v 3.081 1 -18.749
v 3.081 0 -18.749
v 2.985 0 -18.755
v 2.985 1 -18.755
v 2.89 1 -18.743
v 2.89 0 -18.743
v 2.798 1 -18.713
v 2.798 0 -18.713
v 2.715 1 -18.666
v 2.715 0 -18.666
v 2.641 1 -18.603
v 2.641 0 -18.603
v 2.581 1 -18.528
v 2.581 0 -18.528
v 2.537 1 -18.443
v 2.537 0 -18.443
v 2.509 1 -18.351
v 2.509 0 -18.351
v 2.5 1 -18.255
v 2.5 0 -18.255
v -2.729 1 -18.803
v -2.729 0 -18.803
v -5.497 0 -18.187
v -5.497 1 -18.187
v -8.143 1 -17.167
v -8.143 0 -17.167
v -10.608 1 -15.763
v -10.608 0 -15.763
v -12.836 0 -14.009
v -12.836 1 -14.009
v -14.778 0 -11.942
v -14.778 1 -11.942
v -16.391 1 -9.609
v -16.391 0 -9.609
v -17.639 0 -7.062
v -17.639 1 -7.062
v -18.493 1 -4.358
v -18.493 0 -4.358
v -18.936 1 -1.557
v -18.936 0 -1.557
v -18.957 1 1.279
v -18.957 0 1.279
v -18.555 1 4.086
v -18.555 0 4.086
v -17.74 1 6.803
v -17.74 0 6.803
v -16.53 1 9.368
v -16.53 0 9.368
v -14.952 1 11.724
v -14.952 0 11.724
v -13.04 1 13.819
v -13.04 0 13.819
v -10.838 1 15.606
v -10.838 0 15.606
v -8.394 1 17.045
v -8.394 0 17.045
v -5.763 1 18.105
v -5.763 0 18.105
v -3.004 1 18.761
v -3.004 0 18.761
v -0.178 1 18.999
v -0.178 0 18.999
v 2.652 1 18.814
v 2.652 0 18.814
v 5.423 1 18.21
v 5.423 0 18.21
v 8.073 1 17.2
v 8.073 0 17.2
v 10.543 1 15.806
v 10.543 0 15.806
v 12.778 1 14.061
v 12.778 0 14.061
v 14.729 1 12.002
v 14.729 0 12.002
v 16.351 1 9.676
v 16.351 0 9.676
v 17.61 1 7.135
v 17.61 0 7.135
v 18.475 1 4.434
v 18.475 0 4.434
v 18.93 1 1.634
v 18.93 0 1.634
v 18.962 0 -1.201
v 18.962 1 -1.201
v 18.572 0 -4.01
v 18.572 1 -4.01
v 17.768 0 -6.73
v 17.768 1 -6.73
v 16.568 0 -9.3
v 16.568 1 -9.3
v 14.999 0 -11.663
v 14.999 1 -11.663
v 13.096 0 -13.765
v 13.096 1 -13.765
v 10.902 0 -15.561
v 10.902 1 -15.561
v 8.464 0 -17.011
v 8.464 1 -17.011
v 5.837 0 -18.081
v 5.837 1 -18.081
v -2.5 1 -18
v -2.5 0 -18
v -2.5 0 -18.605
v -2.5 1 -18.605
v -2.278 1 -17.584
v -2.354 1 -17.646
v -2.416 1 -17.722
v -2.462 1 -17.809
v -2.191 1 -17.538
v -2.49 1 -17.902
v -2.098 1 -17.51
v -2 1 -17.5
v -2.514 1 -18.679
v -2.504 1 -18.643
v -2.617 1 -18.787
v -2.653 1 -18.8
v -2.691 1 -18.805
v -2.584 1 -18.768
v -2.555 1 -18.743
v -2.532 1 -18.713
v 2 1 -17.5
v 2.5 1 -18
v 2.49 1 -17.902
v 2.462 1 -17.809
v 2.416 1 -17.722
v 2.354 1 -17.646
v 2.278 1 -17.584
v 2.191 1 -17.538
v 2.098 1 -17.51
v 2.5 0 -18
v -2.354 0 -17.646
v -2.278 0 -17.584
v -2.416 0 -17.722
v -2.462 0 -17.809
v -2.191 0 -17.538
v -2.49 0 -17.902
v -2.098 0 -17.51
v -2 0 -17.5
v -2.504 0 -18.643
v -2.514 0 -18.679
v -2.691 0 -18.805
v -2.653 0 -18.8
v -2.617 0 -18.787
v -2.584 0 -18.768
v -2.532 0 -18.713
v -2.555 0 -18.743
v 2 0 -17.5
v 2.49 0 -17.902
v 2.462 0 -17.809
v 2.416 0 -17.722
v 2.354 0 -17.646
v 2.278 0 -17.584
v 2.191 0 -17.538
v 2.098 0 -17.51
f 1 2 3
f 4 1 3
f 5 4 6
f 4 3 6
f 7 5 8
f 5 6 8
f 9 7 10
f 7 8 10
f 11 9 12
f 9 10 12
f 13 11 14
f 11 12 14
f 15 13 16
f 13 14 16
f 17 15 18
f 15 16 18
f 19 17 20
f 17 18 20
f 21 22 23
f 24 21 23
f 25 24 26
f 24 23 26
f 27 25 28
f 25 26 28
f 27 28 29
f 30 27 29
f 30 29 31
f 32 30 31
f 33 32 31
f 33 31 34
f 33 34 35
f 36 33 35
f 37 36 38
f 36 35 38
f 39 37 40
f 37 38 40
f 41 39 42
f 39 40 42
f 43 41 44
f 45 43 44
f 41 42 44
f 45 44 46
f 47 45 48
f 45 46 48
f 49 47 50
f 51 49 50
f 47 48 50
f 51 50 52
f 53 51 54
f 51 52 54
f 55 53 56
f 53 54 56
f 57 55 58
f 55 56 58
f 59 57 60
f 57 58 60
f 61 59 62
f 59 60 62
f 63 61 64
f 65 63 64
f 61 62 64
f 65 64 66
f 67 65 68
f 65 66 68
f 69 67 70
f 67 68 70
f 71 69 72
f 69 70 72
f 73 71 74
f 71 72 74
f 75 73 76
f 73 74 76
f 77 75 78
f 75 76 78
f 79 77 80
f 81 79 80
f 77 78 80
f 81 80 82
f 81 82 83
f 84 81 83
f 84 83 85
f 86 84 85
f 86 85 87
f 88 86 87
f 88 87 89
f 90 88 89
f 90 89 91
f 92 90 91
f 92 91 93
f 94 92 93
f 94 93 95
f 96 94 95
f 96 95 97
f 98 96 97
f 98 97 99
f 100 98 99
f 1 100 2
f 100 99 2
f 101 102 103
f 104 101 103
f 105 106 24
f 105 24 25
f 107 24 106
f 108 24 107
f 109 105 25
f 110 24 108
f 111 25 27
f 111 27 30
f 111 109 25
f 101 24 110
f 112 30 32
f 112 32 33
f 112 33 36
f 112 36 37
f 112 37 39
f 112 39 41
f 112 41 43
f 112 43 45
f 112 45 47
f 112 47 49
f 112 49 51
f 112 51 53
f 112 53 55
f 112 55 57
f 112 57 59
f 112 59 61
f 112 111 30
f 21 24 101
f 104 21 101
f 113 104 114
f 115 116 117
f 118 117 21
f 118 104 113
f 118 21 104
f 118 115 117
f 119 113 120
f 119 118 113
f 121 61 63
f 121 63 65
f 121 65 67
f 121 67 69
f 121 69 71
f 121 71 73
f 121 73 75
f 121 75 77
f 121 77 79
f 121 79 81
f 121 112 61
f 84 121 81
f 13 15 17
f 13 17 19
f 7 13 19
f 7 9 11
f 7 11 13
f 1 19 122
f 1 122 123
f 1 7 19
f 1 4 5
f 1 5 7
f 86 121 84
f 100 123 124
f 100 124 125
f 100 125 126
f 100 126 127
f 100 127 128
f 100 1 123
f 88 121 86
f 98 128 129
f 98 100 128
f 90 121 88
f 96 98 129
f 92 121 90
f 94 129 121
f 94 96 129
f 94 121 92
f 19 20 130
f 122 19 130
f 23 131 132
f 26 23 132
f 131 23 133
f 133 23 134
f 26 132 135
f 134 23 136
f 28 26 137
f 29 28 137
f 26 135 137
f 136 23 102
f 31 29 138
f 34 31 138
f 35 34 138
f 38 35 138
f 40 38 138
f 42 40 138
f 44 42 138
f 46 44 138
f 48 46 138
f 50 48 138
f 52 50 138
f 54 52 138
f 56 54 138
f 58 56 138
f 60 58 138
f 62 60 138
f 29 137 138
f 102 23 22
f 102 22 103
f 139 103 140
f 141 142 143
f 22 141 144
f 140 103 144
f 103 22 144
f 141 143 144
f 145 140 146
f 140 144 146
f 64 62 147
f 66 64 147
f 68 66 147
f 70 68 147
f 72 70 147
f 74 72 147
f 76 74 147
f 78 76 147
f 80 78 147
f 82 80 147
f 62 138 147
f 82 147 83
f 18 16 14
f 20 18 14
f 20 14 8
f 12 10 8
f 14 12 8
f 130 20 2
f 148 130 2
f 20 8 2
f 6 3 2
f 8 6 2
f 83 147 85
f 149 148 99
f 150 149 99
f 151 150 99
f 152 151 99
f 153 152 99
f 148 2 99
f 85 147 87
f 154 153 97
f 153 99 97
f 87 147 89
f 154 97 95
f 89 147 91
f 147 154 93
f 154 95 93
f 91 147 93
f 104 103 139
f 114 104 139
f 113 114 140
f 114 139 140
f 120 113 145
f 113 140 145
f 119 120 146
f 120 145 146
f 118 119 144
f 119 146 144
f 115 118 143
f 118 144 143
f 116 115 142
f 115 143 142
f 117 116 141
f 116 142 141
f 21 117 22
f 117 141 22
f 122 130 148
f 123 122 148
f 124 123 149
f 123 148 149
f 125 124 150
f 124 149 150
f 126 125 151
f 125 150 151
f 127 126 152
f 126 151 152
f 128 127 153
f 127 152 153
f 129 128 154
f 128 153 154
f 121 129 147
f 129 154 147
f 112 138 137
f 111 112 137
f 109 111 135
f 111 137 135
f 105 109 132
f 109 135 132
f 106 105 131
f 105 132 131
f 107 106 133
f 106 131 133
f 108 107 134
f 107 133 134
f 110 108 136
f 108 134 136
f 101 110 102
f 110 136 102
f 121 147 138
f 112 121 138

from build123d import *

# Parameters (mm, degrees)
BOSS_EXTRUDE1_DEPTH = 1


with BuildPart() as part:
    # Sketch1 → Boss-Extrude1 (new body)
    with BuildSketch(Plane(origin=(0, 0, 0), x_dir=(1, 0, 0), z_dir=(0, 1, 0))):
        with BuildLine():
            Line((2.5, 18.255136264), (2.5, 18))
            ThreePointArc((2.5, 18), (2.353553391, 17.646446609), (2, 17.5))
            Line((2, 17.5), (-2, 17.5))
            ThreePointArc((-2, 17.5), (-2.353553391, 17.646446609), (-2.5, 18))
            Line((-2.5, 18), (-2.5, 18.605106826))
            ThreePointArc((-2.5, 18.605106826), (-2.569127315, 18.756342868), (-2.728723404, 18.803033494))
            ThreePointArc((-2.728723404, 18.803033494), (-0.178274953, -18.999163614), (3.081081081, 18.748518325))
            ThreePointArc((3.081081081, 18.748518325), (2.67638027, 18.636279636), (2.5, 18.255136264))
        make_face()
    extrude(amount=BOSS_EXTRUDE1_DEPTH)


solid = part.part
